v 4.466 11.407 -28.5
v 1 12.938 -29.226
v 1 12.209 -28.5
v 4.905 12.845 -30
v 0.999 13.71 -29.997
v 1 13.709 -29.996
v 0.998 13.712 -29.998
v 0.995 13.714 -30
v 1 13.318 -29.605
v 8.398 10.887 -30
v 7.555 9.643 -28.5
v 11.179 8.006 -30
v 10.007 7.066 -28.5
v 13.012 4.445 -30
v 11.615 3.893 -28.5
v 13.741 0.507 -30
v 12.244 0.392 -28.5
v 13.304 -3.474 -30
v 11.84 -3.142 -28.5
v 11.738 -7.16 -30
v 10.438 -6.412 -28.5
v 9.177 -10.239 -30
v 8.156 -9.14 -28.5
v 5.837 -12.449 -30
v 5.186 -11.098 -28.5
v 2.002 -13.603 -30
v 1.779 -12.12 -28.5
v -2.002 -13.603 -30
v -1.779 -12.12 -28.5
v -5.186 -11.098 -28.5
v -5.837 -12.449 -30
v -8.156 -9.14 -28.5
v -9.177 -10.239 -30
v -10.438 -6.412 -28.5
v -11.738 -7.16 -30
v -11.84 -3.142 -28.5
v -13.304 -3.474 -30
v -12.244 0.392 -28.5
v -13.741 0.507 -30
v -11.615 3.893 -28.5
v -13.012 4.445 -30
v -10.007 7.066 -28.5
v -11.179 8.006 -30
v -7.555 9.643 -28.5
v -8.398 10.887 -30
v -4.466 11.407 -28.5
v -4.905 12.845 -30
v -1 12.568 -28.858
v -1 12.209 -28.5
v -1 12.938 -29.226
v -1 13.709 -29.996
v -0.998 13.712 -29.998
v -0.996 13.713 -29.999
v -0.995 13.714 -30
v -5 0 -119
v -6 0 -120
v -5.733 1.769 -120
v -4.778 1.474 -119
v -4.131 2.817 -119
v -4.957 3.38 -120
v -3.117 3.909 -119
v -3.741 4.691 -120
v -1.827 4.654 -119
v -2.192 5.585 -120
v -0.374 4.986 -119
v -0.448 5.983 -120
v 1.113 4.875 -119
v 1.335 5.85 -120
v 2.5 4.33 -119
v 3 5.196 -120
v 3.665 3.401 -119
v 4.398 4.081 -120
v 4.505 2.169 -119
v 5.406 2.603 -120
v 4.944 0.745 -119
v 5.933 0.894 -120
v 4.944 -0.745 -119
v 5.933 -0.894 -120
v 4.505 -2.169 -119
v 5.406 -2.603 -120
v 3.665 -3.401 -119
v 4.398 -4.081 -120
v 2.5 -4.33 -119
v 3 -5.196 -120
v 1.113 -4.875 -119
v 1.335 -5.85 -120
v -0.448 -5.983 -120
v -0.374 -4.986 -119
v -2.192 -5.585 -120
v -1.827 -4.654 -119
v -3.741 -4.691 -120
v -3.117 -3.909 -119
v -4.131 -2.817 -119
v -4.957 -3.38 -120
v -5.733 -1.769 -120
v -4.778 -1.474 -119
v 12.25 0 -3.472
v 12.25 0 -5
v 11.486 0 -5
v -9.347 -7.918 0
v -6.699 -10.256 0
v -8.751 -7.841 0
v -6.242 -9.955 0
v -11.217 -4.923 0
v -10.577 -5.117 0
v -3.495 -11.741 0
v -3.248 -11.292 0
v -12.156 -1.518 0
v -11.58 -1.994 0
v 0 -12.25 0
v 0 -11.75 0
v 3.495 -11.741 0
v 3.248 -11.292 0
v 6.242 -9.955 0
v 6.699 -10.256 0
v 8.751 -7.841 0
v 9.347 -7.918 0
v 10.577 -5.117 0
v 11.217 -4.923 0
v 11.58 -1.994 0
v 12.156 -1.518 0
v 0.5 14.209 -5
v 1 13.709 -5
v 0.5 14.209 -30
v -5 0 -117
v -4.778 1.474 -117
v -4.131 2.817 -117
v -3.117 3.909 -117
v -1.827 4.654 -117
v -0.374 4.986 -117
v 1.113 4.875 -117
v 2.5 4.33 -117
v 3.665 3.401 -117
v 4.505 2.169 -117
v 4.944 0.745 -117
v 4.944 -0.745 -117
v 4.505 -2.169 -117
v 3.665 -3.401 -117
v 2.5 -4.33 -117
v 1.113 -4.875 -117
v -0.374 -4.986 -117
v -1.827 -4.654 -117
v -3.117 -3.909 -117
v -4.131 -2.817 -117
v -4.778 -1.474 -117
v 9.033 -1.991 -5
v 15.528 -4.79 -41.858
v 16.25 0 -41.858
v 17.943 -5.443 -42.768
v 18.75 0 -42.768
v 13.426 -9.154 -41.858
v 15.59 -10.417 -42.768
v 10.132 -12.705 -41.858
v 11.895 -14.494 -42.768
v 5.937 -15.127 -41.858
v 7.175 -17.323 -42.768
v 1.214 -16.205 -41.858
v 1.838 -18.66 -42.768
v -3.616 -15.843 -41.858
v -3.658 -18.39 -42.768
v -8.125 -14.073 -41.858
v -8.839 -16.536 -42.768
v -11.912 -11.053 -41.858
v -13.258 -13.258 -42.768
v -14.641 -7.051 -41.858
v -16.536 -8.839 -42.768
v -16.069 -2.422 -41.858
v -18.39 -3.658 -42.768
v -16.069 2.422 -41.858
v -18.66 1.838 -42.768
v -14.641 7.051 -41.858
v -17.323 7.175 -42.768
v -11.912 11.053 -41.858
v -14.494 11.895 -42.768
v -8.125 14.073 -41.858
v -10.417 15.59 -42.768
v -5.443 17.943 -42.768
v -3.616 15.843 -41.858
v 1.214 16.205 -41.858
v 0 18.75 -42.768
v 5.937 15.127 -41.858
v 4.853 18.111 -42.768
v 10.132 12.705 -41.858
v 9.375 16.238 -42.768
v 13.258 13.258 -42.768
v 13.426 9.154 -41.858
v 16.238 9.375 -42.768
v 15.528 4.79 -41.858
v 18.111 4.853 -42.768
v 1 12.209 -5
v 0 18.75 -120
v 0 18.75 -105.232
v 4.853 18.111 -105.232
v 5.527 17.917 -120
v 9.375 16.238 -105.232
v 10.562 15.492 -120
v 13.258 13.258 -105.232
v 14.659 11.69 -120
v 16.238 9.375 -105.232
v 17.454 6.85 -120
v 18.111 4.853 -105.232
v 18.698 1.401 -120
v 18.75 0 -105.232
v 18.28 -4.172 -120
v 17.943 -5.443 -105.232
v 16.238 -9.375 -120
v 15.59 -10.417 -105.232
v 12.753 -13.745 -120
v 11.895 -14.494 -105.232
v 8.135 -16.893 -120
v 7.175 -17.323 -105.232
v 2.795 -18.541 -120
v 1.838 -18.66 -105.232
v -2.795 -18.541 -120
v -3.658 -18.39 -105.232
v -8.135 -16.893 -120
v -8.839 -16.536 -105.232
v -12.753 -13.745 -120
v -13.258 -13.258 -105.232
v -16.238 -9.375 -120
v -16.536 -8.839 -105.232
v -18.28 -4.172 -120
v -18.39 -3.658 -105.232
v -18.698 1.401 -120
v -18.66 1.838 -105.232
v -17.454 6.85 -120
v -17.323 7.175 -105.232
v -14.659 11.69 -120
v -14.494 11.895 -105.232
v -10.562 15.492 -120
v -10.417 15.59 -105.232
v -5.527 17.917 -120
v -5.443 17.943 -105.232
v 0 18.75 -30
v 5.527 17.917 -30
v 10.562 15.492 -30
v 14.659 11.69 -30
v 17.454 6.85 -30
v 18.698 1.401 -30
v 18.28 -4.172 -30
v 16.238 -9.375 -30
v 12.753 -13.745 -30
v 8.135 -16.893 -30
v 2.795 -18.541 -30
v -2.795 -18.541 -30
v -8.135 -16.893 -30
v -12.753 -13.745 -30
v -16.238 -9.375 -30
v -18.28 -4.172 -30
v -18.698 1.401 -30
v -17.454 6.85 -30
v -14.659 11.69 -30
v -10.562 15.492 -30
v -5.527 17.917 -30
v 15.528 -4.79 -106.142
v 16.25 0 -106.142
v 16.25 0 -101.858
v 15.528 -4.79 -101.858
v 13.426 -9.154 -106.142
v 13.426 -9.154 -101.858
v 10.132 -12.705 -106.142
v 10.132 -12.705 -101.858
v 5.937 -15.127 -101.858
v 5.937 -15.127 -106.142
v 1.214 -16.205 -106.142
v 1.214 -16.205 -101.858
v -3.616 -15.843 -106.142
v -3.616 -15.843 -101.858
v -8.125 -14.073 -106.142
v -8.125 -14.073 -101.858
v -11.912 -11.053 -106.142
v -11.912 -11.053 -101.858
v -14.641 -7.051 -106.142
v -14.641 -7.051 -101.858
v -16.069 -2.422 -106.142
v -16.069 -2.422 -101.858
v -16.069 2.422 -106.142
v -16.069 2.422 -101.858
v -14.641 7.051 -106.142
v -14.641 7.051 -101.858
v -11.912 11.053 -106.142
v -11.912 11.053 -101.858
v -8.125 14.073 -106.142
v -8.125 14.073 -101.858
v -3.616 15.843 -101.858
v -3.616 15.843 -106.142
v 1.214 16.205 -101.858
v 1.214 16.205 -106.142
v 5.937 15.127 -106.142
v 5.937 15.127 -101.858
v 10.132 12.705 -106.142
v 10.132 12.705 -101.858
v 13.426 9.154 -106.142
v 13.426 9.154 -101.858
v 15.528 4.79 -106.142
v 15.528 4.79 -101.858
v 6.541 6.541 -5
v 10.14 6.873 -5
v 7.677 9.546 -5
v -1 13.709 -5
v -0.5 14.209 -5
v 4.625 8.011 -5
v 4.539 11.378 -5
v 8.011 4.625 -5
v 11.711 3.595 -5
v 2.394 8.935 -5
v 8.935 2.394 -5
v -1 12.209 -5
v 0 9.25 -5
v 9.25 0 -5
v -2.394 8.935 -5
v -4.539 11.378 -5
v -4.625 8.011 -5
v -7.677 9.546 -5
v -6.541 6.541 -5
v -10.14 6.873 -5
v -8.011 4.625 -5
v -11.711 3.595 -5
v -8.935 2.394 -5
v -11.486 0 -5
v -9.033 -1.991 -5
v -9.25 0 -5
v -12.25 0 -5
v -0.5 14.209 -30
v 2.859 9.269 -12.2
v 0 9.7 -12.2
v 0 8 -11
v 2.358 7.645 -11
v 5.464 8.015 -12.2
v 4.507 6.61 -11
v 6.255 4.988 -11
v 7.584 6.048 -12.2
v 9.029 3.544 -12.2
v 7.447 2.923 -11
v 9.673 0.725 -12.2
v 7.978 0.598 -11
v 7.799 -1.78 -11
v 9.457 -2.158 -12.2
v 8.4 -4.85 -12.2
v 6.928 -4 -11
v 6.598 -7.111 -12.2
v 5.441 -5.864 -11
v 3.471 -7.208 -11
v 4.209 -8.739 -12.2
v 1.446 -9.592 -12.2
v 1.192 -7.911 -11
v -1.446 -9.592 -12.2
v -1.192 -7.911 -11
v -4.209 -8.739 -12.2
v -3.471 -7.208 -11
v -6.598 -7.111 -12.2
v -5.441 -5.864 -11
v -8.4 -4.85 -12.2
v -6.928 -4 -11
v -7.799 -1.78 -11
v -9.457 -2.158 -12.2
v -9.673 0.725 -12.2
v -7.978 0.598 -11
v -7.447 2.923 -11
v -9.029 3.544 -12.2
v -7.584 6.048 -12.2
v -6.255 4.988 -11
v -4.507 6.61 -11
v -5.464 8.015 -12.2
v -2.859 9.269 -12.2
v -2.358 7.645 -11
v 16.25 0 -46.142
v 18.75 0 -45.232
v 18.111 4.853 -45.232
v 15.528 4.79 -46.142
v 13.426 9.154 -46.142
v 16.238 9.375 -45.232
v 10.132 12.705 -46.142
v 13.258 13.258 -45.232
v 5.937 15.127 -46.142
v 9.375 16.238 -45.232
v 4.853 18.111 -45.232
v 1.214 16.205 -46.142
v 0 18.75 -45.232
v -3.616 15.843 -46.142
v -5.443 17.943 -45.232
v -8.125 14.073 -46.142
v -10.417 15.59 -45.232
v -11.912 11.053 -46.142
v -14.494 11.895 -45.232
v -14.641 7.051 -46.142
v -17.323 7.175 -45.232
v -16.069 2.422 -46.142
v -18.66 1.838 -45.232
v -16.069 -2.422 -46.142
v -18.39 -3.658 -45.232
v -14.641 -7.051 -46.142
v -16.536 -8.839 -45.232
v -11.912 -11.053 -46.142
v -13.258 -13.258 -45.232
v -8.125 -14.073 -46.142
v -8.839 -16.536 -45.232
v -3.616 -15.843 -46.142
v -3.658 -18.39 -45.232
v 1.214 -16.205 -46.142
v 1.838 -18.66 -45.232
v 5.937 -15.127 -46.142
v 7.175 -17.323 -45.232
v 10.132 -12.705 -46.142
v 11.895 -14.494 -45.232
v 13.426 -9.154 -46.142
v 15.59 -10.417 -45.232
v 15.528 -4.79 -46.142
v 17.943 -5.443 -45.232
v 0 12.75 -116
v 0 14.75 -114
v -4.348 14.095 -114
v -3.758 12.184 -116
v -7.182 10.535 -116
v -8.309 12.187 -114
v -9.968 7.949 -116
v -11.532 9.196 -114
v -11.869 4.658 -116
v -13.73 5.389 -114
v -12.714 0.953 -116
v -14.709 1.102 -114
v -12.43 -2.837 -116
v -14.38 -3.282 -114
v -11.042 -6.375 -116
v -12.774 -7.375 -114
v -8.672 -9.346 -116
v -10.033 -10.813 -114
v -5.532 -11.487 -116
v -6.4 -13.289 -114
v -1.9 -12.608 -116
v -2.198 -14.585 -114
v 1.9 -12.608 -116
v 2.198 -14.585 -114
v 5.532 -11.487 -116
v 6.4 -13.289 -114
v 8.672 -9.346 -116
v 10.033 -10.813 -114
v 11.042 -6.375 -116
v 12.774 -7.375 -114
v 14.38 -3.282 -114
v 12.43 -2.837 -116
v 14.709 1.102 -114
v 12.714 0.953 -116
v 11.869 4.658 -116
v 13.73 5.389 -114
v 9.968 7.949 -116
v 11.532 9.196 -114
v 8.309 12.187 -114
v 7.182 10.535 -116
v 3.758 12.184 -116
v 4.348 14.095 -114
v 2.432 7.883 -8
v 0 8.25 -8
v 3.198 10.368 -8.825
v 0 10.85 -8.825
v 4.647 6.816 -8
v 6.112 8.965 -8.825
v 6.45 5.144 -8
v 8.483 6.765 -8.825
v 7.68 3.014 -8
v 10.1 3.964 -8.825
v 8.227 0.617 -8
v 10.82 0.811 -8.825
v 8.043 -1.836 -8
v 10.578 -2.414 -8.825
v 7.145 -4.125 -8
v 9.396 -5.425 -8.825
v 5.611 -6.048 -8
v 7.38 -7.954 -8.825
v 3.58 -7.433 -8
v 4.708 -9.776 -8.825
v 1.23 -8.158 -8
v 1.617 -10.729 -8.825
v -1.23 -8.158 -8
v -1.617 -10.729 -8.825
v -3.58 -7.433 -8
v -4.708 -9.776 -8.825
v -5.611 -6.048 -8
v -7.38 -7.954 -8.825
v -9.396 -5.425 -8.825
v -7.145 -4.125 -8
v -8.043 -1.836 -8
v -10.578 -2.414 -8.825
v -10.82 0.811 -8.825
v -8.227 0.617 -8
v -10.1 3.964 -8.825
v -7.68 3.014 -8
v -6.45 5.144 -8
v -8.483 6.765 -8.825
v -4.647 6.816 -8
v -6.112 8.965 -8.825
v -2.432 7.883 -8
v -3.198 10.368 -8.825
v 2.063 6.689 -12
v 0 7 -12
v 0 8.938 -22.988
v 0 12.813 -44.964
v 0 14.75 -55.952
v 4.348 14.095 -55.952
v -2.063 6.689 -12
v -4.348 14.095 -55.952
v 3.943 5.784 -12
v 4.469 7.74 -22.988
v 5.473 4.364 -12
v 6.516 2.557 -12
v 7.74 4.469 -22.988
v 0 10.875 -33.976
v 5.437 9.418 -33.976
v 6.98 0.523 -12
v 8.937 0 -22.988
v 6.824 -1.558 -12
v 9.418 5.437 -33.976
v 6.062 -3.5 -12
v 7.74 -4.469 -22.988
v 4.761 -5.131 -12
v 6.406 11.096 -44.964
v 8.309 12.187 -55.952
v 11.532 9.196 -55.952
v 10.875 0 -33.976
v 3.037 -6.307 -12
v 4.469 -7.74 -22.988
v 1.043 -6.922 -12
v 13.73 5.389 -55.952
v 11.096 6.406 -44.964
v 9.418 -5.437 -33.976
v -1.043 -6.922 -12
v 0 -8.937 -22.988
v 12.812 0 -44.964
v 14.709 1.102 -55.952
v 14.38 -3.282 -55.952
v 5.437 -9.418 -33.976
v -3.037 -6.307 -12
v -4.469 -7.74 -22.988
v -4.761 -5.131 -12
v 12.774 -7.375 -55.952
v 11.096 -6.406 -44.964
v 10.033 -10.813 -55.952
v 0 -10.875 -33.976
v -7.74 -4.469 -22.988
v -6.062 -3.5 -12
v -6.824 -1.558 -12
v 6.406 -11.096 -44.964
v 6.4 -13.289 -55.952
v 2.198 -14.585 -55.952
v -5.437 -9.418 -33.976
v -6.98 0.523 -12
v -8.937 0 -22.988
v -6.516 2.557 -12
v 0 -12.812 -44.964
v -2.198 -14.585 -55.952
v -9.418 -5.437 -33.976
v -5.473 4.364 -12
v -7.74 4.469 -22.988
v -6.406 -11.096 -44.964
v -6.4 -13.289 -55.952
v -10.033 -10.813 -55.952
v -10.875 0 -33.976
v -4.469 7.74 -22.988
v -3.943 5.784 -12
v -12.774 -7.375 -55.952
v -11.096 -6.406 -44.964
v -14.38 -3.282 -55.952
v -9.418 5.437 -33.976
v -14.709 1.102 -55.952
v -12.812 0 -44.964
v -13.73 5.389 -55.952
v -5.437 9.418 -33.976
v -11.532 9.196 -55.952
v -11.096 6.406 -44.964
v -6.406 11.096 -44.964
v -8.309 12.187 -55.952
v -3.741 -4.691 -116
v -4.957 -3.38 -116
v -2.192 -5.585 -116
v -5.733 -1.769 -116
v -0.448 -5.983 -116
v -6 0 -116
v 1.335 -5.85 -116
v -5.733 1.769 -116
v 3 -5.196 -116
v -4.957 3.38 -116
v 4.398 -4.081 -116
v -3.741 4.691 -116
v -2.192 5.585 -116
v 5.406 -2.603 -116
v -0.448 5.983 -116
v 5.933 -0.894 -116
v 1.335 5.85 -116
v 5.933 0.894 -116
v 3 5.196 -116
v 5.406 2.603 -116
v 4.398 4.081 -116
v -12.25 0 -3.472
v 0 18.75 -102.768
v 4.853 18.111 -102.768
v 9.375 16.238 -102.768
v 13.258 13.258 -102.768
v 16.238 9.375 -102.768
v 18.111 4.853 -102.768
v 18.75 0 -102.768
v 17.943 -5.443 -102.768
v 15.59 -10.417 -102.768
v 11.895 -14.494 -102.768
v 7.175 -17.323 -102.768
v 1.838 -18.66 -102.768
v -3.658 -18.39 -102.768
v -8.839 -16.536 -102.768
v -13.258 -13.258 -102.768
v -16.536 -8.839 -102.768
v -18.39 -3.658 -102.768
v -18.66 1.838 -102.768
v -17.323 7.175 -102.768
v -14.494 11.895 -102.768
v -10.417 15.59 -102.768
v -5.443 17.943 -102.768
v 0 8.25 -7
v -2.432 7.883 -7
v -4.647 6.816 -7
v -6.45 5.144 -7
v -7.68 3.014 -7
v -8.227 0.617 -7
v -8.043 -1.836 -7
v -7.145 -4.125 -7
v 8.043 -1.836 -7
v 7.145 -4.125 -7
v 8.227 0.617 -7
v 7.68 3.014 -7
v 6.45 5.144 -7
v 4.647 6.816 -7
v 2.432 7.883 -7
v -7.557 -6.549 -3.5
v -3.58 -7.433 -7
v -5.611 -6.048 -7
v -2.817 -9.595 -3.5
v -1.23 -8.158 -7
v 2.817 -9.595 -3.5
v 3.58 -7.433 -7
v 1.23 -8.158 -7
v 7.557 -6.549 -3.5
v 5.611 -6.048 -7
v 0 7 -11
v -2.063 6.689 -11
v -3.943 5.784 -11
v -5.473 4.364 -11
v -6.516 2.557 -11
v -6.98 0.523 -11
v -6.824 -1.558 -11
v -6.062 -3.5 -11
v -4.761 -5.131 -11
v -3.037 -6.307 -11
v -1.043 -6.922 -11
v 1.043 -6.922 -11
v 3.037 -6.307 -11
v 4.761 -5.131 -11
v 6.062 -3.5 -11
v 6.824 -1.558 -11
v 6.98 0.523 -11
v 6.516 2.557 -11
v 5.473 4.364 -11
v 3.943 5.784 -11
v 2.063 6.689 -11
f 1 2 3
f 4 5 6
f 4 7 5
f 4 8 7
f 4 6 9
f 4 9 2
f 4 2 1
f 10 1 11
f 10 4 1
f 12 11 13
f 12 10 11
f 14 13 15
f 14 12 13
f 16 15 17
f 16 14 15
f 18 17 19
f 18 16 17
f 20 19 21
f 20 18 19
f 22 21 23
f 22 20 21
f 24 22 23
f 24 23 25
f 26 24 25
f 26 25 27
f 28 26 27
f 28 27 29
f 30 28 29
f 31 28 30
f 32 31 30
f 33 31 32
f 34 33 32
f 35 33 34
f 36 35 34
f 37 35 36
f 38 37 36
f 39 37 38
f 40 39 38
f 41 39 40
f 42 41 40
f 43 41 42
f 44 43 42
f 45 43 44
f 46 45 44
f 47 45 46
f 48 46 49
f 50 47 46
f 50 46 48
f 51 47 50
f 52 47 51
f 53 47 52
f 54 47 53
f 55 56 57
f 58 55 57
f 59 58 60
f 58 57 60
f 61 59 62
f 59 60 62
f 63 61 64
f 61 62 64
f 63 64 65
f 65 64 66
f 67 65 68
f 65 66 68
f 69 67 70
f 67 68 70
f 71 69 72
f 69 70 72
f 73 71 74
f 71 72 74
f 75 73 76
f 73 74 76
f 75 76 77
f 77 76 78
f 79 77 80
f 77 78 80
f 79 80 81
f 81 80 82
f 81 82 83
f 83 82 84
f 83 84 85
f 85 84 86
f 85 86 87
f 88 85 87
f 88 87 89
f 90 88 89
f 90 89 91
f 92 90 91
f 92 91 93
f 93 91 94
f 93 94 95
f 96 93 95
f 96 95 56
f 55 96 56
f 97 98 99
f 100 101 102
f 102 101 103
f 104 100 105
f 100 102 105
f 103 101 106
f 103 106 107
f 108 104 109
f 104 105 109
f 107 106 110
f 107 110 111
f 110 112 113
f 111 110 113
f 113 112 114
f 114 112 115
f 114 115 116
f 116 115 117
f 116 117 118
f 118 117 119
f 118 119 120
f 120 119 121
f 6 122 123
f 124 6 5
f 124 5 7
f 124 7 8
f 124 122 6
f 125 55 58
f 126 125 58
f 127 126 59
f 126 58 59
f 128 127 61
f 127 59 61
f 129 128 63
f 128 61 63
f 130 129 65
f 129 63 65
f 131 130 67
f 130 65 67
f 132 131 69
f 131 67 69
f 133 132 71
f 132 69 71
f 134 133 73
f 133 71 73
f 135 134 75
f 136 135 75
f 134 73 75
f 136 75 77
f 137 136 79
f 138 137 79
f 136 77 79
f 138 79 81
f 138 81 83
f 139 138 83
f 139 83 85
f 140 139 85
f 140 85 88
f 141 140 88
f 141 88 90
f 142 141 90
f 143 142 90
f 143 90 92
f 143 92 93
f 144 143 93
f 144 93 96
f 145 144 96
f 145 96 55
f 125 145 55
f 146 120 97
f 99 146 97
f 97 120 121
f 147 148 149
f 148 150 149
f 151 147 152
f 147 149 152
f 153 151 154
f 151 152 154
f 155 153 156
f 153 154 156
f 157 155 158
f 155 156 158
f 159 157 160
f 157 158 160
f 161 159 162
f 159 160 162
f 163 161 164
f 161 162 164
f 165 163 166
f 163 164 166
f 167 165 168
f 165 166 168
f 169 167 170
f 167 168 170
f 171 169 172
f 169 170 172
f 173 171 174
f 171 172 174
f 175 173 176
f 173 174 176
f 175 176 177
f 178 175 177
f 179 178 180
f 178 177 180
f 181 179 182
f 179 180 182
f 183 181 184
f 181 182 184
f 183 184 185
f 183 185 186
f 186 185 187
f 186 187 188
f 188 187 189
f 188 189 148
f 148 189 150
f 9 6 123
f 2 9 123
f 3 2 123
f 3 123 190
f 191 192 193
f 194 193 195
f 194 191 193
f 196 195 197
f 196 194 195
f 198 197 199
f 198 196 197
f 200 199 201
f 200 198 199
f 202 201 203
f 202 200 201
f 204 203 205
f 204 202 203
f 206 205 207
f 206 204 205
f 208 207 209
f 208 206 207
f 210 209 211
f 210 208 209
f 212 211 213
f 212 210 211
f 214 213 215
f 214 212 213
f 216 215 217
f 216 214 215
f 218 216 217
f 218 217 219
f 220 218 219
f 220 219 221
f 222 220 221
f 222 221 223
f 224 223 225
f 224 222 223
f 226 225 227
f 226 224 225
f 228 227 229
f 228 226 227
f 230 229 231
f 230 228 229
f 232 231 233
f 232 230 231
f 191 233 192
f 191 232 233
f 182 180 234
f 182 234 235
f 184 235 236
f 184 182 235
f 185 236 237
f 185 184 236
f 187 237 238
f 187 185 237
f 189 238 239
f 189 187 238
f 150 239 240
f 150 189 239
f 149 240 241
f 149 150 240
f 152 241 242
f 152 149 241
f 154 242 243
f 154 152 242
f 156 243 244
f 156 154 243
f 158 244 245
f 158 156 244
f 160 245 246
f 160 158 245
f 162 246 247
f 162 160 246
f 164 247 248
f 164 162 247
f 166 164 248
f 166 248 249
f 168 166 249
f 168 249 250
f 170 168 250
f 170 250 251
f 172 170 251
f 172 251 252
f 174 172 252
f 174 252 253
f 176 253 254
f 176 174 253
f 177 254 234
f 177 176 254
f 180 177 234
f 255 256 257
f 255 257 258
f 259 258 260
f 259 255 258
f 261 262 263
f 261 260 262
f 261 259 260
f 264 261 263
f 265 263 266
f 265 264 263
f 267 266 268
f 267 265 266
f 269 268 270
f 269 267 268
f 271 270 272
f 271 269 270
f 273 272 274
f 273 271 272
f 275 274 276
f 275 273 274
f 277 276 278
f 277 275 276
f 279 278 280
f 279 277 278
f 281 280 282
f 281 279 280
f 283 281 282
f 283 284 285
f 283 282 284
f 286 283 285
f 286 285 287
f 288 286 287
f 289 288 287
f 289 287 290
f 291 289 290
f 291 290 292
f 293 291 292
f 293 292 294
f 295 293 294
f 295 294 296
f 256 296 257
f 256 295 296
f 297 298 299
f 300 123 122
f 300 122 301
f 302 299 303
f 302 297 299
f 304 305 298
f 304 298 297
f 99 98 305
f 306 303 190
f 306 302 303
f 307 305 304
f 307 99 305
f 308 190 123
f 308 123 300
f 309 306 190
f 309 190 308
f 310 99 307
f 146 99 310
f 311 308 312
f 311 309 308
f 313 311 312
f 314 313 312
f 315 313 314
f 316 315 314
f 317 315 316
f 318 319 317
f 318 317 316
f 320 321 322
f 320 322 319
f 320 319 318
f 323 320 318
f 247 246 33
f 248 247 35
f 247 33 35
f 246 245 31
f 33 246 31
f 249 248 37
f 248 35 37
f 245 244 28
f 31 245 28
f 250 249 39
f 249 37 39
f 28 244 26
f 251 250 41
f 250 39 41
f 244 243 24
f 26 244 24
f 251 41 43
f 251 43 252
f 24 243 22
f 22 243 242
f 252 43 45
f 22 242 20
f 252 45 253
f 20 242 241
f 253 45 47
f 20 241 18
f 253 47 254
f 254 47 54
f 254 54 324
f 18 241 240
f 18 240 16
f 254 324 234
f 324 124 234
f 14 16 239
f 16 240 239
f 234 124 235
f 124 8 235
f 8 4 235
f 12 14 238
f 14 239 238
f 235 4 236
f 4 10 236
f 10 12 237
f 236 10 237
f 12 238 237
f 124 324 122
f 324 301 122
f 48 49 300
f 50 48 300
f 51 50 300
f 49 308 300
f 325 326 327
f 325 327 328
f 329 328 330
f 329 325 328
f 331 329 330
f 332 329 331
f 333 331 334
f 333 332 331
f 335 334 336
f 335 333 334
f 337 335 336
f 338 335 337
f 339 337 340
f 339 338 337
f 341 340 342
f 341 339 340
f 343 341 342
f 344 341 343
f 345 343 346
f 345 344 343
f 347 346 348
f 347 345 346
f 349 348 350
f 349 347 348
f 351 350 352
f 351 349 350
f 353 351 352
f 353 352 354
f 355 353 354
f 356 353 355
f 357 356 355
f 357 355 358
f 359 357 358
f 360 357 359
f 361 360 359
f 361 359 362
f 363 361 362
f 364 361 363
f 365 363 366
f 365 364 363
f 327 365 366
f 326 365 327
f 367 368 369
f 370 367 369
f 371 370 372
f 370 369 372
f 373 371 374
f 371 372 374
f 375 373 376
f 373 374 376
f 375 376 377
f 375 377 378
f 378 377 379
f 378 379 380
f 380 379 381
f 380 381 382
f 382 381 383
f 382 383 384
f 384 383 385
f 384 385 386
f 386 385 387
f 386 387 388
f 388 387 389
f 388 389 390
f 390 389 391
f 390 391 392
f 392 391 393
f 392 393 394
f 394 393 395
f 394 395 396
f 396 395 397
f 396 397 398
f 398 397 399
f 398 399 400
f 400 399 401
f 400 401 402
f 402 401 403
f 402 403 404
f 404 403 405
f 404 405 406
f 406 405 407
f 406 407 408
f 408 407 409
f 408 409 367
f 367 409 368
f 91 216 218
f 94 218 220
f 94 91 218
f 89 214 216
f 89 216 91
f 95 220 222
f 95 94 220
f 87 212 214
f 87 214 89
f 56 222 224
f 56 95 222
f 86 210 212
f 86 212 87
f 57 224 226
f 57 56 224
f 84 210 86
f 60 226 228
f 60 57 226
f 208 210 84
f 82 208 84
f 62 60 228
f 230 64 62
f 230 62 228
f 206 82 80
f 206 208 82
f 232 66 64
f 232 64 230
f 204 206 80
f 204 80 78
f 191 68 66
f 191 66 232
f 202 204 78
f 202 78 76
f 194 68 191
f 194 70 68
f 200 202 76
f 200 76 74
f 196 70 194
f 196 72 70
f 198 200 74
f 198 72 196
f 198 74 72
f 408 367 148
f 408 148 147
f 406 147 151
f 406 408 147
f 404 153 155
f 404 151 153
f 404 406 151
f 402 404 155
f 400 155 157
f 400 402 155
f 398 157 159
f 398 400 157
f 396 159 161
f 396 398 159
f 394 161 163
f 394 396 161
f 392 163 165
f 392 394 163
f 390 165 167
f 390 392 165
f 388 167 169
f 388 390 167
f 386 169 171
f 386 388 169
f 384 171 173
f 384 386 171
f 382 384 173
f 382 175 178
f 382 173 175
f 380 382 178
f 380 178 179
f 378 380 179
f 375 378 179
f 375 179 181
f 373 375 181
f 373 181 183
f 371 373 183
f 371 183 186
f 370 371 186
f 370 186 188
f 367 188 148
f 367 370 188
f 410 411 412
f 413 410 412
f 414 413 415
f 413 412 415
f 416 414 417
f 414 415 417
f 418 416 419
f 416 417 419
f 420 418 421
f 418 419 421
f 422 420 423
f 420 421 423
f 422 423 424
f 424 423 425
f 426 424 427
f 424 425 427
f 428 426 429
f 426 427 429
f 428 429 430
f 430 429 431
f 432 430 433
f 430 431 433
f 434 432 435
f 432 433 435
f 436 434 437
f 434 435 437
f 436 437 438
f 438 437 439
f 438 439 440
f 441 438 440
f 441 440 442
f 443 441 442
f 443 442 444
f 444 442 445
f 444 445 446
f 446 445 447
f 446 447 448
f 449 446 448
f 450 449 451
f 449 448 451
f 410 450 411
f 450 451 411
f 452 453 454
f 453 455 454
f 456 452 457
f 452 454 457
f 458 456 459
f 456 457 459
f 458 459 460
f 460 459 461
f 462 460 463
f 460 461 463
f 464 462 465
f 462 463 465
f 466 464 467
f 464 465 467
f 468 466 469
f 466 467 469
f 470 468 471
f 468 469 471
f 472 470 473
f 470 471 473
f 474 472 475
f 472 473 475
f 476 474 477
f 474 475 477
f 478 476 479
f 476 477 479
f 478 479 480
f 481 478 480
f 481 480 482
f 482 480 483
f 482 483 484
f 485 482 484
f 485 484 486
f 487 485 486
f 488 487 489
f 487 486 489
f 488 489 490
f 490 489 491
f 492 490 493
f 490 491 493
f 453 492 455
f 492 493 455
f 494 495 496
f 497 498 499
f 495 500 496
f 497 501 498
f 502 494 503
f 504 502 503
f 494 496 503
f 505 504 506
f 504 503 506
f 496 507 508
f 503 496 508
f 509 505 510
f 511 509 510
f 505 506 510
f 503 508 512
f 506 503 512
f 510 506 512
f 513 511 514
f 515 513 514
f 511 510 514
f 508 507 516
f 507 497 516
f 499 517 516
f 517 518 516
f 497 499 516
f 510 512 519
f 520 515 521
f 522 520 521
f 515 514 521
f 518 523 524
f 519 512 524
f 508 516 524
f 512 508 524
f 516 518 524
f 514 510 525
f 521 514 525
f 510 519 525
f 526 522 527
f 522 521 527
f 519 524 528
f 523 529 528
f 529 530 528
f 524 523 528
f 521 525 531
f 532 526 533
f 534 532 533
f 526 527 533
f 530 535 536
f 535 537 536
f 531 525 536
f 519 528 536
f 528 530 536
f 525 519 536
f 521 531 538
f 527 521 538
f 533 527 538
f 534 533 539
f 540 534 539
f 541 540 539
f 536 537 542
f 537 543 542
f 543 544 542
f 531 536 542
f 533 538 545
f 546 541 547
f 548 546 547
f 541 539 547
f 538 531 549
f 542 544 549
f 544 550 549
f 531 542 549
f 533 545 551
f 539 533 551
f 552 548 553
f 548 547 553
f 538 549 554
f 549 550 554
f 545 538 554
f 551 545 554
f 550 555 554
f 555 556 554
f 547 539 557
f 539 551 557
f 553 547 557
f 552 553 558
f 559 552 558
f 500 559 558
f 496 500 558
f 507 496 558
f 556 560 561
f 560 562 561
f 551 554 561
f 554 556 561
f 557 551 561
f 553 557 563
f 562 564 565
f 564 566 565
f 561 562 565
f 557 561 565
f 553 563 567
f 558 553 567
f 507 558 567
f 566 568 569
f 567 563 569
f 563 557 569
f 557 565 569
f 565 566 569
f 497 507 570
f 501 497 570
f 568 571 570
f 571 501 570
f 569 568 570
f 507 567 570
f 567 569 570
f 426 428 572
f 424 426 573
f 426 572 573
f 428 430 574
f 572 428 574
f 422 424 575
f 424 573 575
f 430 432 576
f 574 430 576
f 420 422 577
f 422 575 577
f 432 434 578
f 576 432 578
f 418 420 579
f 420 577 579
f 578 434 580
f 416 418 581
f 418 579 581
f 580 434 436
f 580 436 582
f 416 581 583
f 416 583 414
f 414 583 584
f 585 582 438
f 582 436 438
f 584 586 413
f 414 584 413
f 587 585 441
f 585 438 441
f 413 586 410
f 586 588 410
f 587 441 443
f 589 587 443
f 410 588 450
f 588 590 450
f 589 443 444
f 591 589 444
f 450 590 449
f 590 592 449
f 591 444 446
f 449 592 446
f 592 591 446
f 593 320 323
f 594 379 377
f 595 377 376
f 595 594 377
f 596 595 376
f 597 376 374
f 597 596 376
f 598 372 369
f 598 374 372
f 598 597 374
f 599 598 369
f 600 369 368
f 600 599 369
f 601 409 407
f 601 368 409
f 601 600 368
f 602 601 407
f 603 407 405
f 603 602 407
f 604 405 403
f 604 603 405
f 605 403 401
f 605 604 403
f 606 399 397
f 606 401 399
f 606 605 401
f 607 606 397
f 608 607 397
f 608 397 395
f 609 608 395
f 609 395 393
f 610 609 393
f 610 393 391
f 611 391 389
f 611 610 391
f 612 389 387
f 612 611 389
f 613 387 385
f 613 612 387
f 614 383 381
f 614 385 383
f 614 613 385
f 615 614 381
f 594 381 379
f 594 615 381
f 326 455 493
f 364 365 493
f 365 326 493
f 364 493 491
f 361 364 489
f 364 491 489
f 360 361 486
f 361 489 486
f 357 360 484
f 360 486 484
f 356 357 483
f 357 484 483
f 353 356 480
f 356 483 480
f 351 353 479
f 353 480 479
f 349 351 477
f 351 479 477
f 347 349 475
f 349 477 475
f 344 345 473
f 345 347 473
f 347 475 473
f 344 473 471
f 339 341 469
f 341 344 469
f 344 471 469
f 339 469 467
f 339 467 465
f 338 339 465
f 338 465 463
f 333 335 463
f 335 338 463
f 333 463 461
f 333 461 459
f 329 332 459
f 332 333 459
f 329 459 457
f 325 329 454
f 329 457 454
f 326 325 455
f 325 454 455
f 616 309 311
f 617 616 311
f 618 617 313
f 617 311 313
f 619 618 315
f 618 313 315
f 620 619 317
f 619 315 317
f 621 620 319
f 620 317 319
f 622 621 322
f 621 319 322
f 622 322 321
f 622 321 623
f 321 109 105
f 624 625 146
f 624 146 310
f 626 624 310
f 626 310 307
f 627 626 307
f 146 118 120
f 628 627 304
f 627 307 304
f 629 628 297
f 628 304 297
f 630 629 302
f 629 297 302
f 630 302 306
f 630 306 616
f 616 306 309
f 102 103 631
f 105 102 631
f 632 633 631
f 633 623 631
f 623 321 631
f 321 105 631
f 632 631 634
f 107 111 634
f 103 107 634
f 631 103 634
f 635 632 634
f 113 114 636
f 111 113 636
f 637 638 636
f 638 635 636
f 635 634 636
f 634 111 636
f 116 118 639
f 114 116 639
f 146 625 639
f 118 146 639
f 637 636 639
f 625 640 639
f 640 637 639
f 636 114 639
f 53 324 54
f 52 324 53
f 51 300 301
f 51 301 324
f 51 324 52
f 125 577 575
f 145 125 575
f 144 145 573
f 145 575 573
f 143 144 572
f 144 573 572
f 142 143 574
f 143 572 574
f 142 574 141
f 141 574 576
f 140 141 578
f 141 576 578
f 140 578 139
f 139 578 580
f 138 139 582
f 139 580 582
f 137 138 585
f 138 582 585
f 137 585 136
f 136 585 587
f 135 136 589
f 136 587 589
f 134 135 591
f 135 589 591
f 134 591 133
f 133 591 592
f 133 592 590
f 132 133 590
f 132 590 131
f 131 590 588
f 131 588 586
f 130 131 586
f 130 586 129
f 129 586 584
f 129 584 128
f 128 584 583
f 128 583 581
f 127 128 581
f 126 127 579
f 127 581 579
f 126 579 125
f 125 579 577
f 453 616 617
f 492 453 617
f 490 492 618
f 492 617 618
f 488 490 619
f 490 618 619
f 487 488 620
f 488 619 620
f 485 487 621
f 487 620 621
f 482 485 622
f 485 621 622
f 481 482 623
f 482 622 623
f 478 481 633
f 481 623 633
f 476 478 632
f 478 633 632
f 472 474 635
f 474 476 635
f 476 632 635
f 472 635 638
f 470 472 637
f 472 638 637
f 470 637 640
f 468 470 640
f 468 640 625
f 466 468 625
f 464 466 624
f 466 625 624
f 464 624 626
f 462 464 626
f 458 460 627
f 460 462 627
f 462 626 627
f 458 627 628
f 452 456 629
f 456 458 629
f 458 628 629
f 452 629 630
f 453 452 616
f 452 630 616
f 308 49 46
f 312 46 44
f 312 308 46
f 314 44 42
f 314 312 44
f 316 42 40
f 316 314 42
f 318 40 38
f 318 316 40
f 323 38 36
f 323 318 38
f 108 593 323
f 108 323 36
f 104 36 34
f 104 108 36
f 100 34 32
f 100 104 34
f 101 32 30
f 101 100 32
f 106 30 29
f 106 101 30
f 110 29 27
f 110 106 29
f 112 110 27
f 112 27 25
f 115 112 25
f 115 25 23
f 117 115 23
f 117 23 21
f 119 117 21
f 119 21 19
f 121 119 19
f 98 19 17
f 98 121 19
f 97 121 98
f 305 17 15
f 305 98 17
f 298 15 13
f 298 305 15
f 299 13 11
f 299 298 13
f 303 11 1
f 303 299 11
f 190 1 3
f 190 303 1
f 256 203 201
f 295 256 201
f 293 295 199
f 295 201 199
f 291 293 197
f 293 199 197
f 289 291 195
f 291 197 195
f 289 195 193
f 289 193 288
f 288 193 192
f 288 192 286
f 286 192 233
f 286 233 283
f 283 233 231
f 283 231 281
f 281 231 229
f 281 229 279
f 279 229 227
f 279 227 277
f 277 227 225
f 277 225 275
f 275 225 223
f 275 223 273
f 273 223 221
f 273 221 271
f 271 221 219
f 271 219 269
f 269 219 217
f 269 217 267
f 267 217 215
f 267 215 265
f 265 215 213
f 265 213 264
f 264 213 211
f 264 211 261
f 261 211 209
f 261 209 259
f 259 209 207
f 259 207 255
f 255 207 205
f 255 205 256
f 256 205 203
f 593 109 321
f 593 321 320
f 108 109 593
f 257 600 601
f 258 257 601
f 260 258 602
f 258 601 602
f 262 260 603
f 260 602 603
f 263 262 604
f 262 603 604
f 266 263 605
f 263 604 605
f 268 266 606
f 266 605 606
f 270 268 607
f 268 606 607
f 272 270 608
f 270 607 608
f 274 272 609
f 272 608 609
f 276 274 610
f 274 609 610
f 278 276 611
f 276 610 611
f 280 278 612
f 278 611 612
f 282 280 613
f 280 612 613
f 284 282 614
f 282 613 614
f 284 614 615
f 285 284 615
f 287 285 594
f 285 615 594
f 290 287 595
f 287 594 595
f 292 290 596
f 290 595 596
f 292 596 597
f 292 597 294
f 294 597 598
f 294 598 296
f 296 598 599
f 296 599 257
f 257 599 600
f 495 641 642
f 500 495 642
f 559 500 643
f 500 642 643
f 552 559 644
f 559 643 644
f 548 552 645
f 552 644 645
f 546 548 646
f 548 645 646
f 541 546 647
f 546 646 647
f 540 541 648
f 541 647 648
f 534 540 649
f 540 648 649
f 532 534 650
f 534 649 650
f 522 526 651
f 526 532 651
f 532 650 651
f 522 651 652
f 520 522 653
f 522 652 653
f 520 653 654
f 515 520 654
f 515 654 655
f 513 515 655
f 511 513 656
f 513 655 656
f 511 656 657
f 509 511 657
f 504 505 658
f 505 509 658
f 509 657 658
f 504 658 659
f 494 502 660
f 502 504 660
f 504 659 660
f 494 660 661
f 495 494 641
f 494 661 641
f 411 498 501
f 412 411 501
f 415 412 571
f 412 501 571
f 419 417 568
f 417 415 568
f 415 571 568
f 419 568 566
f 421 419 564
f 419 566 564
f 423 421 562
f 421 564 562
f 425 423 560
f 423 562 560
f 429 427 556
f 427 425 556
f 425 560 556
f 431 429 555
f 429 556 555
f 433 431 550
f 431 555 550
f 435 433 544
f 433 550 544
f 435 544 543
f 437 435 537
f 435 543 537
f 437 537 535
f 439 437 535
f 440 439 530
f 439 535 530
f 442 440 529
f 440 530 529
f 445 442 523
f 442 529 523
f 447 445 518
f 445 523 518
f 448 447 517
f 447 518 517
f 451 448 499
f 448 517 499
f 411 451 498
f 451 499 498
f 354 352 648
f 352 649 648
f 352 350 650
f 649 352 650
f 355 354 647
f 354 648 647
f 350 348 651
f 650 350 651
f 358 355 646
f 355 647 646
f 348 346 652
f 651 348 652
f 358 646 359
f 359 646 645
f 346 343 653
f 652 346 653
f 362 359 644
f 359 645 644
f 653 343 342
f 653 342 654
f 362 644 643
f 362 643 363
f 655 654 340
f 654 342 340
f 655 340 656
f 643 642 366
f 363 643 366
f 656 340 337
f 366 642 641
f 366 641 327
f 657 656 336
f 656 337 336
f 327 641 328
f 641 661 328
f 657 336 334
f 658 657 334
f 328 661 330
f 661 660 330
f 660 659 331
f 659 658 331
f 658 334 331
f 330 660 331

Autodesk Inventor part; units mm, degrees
ref_plane "YZ Plane" through (0, 0, 0) normal (1, 0, 0) x (0, 1, 0)
ref_plane "XZ Plane" through (0, 0, 0) normal (0, 1, 0) x (-1, 0, 0)
ref_plane "XY Plane" through (0, 0, 0) normal (0, 0, 1) x (1, 0, 0)
sketch "Esquisse1" plane through (0, 0, 0) normal (1, 0, 0) x (0, 1, 0)
  line L0 (0, 0) -> (0, -31.2712)
  line L1 (18.75, -30) -> (18.75, -120)
  line L2 (18.75, -120) -> (0, -120)
  line L3 (14.75, -116) -> (14.75, -55.9524)
  line L4 (14.75, -55.9524) -> (7, -12)
  line L5 (7, -12) -> (7, -11)
  line L6 (7, -11) -> (8, -11)
  line L7 (8, -11) -> (9.7, -12.2)
  line L8 (9.7, -12.2) -> (10.85, -8.8246)
  line L9 (10.85, -8.8246) -> (8.25, -8)
  circle A0 centre (8.85, -9.7639) radius 1.5 construction
  line L10 (8.25, -8) -> (8.25, -7)
  line L11 (8.25, -7) -> (11.75, 0)
  line L12 (18.75, -30) -> (12.25, -30)
  line L13 (12.25, -30) -> (12.25, 0)
  line L14 (12.25, 0) -> (11.75, 0)
  line L15 (0, -120) -> (0, -116)
  line L16 (14.75, -116) -> (0, -116)
  point P0 (9.7477, -27.583)
  dimension "d1" = 37.5
  dimension "d3" = 14
  dimension "d6" = 3
  dimension "d7" = 1
  dimension "d8" = 1
  dimension "d11" = 3
  dimension "d12" = 0.6
  dimension "d13" = 1.2
  dimension "d14" = 1.7
  dimension "d15" = 2.6
  dimension "d29" = 24.5
  dimension "d30" = 0.5
  dimension "d31" = 30
  dimension "d34" = 1
  dimension "d36" = 16.5
  dimension "d37" = 11
  dimension "d38" = 90
  dimension "d58" = 7.75
  dimension "d59" = 170
  dimension "d60" = 19.4954
  dimension "d61" = 4
  dimension "d62" = 4
revolve "Révolution2" add sketch "Esquisse1" angle 360 about axis through (0, 0, 0) along (0, 0, -1)
sketch "Esquisse2" plane through (0, 0, 0) normal (0, 1, 0) x (-1, 0, 0)
  line L0 (-18.75, -30) -> (18.75, -30) projected
  line L1 (-18.75, -120) -> (18.75, -120) projected
  line L2 (-14.75, -55.9524) -> (14.75, -55.9524) projected
  line L3 (-7, -12) -> (7, -12) projected
  line L4 (-18.75, -30) -> (-18.75, -120) projected
  line L5 (-18.75, -42.7677) -> (-16.25, -41.8578)
  line L6 (-16.25, -41.8578) -> (-16.25, -46.1422)
  line L7 (-16.25, -46.1422) -> (-18.75, -45.2323)
  circle A0 centre (-17.75, -44) radius 1.5 construction
  line L8 (0, -144) -> (0, 24) projected
  point P0 (0, 0)
  dimension "d42" = 3
  dimension "d45" = 1
  dimension "d46" = 70
  dimension "d47" = 70
  dimension "d48" = 14
revolve "Révolution3" cut sketch "Esquisse2" angle 360 about axis through (0, 0, -10) along (0, 0, 1) contours L5 L6 L7 L4
chamfer "Chanfrein4" distance 1.5 angle 45 1 edges at (0, -12.25, -30)
pattern_linear "Réseau rectangulaire1" count 2 spacing 60 along (0, 0, -1) of "Révolution3"
chamfer "Chanfrein5" distance 2 angle 45 1 edges at (0, -14.75, -116)
sketch "Esquisse3" plane through (0, 0, 0) normal (0, 0, 1) x (1, 0, 0)
  circle A0 centre (0, 0) radius 11.75 projected
  circle A1 centre (0, 0) radius 12.25 projected
  line L0 (-1, 14.2091) -> (1, 14.2091)
  line L1 (1, 14.2091) -> (1, 12.2091)
  line L2 (1, 12.2091) -> (-1, 12.2091)
  line L3 (-1, 12.2091) -> (-1, 14.2091)
  circle A2 centre (0, 0) radius 12.25 projected
  point P0 (0, 12.2091)
  dimension "d66" = 2
  dimension "d67" = 2
extrude "Extrusion1" add sketch "Esquisse3" against normal up to surface (30 mm away) contours L2 A1 | A1 L3 L0 L1 picked at (-0.1112, 12.2212)
chamfer "Chanfrein6" distance 0.5 angle 45 2 edges at (1, 14.2091, -15) (-1, 14.2091, -15)
sketch "Esquisse8" plane through (0, 0, -120) normal (0, 0, -1) x (-1, 0, 0)
  circle A0 centre (0, 0) radius 5
  dimension "d100" = 10
extrude "Extrusion5" cut sketch "Esquisse8" against normal up to surface (4 mm away)
chamfer "Chanfrein8" distance 1 angle 45 2 edges at (5, 0, -120) (5, 0, -116)
sketch "Esquisse9" plane through (0, 0, 0) normal (0, 1, 0) x (-1, 0, 0)
  line L0 (1, 0) -> (1, -28.5) projected
  line L1 (-1, -28.5) -> (1, -28.5) projected
  line L2 (-1, -28.5) -> (-1, 0) projected
  line L3 (-1, 0) -> (1, 0) projected
  line L4 (8.25, -7) -> (11.75, 0) projected
  line L5 (-8.25, -7) -> (-11.75, 0) projected
  line L6 (12.25, 0) -> (-12.25, 0)
  line L7 (-12.25, 0) -> (-12.25, -5)
  line L8 (-12.25, -5) -> (12.25, -5)
  line L9 (12.25, -5) -> (12.25, 0)
  line L10 (-12.25, 0) -> (12.25, 0) projected
  line L11 (-8.25, -7) -> (8.25, -7) projected
  line L12 (-12.25, 0) -> (-12.25, -28.5) projected
  point P0 (0, 0)
  dimension "d108" = 2
  dimension "d112" = 5
extrude "Extrusion6" cut sketch "Esquisse9" along normal blind 15 contours L6 L4 L8 L0 | L0 L8 L2 L3 | L2 L8 L5 L6 | L6 L9 L8 L4 | L5 L8 L7 L6
chamfer "Chanfrein9" distance 2 angle 45 2 edges at (10.5, 0, -2.5) (-10.5, 0, -2.5)
equation "\"d47\" = d46"
properties part number "douille_bloqueur"
